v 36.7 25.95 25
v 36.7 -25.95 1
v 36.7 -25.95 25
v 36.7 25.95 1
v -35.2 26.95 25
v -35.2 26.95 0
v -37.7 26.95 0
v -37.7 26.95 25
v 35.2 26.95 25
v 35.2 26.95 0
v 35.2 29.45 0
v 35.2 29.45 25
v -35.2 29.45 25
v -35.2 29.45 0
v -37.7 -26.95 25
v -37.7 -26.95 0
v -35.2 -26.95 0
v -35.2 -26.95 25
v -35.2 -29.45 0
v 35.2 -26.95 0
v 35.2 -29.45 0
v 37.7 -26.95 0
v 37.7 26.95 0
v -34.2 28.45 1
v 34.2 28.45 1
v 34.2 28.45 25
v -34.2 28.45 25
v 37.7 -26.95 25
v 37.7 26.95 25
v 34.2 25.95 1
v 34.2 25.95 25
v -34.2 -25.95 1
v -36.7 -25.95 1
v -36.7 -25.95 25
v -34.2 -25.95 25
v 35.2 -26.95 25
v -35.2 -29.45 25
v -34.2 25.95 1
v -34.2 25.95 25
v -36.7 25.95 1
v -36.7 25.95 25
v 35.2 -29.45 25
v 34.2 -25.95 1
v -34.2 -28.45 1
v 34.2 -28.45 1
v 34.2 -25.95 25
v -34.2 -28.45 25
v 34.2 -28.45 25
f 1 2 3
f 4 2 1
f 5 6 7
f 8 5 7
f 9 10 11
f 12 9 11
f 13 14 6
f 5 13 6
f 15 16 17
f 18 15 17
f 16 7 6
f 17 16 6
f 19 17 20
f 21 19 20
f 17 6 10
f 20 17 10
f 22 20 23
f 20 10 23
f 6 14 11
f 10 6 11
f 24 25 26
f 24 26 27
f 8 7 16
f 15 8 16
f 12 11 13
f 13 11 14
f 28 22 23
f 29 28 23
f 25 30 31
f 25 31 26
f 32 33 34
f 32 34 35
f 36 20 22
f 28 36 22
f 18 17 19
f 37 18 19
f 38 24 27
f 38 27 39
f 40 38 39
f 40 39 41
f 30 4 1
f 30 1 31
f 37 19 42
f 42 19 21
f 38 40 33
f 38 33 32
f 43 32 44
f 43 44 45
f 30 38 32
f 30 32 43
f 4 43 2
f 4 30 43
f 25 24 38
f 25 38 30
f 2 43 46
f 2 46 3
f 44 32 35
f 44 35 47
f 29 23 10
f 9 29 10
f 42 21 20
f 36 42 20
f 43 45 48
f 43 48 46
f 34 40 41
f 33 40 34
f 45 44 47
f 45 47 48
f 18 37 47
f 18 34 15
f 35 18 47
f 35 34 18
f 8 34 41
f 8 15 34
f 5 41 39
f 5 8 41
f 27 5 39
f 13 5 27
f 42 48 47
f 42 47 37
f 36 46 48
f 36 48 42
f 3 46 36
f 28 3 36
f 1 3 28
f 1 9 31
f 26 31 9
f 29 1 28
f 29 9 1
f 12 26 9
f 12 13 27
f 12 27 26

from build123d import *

# Parameters (mm, degrees)
F1_DEPTH = 25
F2_T     = -1


with BuildPart() as f1:
    # F0 (on Top) → F1 (new body)
    with BuildSketch(Plane.XY):
        Polygon((35.2, 26.95), (35.2, 29.45), (-35.2, 29.45), (-35.2, 26.95), (-37.7, 26.95), (-37.7, -26.95), (-35.2, -26.95), (-35.2, -29.45), (35.2, -29.45), (35.2, -26.95), (37.7, -26.95), (37.7, 26.95), align=None)
    extrude(amount=F1_DEPTH)

    # F2
    f2_openings = [f1.faces().sort_by_distance(p)[0] for p in [
        (0, 0, 25),
    ]]
    offset(amount=F2_T, openings=f2_openings, kind=Kind.INTERSECTION)


solid = f1.part
